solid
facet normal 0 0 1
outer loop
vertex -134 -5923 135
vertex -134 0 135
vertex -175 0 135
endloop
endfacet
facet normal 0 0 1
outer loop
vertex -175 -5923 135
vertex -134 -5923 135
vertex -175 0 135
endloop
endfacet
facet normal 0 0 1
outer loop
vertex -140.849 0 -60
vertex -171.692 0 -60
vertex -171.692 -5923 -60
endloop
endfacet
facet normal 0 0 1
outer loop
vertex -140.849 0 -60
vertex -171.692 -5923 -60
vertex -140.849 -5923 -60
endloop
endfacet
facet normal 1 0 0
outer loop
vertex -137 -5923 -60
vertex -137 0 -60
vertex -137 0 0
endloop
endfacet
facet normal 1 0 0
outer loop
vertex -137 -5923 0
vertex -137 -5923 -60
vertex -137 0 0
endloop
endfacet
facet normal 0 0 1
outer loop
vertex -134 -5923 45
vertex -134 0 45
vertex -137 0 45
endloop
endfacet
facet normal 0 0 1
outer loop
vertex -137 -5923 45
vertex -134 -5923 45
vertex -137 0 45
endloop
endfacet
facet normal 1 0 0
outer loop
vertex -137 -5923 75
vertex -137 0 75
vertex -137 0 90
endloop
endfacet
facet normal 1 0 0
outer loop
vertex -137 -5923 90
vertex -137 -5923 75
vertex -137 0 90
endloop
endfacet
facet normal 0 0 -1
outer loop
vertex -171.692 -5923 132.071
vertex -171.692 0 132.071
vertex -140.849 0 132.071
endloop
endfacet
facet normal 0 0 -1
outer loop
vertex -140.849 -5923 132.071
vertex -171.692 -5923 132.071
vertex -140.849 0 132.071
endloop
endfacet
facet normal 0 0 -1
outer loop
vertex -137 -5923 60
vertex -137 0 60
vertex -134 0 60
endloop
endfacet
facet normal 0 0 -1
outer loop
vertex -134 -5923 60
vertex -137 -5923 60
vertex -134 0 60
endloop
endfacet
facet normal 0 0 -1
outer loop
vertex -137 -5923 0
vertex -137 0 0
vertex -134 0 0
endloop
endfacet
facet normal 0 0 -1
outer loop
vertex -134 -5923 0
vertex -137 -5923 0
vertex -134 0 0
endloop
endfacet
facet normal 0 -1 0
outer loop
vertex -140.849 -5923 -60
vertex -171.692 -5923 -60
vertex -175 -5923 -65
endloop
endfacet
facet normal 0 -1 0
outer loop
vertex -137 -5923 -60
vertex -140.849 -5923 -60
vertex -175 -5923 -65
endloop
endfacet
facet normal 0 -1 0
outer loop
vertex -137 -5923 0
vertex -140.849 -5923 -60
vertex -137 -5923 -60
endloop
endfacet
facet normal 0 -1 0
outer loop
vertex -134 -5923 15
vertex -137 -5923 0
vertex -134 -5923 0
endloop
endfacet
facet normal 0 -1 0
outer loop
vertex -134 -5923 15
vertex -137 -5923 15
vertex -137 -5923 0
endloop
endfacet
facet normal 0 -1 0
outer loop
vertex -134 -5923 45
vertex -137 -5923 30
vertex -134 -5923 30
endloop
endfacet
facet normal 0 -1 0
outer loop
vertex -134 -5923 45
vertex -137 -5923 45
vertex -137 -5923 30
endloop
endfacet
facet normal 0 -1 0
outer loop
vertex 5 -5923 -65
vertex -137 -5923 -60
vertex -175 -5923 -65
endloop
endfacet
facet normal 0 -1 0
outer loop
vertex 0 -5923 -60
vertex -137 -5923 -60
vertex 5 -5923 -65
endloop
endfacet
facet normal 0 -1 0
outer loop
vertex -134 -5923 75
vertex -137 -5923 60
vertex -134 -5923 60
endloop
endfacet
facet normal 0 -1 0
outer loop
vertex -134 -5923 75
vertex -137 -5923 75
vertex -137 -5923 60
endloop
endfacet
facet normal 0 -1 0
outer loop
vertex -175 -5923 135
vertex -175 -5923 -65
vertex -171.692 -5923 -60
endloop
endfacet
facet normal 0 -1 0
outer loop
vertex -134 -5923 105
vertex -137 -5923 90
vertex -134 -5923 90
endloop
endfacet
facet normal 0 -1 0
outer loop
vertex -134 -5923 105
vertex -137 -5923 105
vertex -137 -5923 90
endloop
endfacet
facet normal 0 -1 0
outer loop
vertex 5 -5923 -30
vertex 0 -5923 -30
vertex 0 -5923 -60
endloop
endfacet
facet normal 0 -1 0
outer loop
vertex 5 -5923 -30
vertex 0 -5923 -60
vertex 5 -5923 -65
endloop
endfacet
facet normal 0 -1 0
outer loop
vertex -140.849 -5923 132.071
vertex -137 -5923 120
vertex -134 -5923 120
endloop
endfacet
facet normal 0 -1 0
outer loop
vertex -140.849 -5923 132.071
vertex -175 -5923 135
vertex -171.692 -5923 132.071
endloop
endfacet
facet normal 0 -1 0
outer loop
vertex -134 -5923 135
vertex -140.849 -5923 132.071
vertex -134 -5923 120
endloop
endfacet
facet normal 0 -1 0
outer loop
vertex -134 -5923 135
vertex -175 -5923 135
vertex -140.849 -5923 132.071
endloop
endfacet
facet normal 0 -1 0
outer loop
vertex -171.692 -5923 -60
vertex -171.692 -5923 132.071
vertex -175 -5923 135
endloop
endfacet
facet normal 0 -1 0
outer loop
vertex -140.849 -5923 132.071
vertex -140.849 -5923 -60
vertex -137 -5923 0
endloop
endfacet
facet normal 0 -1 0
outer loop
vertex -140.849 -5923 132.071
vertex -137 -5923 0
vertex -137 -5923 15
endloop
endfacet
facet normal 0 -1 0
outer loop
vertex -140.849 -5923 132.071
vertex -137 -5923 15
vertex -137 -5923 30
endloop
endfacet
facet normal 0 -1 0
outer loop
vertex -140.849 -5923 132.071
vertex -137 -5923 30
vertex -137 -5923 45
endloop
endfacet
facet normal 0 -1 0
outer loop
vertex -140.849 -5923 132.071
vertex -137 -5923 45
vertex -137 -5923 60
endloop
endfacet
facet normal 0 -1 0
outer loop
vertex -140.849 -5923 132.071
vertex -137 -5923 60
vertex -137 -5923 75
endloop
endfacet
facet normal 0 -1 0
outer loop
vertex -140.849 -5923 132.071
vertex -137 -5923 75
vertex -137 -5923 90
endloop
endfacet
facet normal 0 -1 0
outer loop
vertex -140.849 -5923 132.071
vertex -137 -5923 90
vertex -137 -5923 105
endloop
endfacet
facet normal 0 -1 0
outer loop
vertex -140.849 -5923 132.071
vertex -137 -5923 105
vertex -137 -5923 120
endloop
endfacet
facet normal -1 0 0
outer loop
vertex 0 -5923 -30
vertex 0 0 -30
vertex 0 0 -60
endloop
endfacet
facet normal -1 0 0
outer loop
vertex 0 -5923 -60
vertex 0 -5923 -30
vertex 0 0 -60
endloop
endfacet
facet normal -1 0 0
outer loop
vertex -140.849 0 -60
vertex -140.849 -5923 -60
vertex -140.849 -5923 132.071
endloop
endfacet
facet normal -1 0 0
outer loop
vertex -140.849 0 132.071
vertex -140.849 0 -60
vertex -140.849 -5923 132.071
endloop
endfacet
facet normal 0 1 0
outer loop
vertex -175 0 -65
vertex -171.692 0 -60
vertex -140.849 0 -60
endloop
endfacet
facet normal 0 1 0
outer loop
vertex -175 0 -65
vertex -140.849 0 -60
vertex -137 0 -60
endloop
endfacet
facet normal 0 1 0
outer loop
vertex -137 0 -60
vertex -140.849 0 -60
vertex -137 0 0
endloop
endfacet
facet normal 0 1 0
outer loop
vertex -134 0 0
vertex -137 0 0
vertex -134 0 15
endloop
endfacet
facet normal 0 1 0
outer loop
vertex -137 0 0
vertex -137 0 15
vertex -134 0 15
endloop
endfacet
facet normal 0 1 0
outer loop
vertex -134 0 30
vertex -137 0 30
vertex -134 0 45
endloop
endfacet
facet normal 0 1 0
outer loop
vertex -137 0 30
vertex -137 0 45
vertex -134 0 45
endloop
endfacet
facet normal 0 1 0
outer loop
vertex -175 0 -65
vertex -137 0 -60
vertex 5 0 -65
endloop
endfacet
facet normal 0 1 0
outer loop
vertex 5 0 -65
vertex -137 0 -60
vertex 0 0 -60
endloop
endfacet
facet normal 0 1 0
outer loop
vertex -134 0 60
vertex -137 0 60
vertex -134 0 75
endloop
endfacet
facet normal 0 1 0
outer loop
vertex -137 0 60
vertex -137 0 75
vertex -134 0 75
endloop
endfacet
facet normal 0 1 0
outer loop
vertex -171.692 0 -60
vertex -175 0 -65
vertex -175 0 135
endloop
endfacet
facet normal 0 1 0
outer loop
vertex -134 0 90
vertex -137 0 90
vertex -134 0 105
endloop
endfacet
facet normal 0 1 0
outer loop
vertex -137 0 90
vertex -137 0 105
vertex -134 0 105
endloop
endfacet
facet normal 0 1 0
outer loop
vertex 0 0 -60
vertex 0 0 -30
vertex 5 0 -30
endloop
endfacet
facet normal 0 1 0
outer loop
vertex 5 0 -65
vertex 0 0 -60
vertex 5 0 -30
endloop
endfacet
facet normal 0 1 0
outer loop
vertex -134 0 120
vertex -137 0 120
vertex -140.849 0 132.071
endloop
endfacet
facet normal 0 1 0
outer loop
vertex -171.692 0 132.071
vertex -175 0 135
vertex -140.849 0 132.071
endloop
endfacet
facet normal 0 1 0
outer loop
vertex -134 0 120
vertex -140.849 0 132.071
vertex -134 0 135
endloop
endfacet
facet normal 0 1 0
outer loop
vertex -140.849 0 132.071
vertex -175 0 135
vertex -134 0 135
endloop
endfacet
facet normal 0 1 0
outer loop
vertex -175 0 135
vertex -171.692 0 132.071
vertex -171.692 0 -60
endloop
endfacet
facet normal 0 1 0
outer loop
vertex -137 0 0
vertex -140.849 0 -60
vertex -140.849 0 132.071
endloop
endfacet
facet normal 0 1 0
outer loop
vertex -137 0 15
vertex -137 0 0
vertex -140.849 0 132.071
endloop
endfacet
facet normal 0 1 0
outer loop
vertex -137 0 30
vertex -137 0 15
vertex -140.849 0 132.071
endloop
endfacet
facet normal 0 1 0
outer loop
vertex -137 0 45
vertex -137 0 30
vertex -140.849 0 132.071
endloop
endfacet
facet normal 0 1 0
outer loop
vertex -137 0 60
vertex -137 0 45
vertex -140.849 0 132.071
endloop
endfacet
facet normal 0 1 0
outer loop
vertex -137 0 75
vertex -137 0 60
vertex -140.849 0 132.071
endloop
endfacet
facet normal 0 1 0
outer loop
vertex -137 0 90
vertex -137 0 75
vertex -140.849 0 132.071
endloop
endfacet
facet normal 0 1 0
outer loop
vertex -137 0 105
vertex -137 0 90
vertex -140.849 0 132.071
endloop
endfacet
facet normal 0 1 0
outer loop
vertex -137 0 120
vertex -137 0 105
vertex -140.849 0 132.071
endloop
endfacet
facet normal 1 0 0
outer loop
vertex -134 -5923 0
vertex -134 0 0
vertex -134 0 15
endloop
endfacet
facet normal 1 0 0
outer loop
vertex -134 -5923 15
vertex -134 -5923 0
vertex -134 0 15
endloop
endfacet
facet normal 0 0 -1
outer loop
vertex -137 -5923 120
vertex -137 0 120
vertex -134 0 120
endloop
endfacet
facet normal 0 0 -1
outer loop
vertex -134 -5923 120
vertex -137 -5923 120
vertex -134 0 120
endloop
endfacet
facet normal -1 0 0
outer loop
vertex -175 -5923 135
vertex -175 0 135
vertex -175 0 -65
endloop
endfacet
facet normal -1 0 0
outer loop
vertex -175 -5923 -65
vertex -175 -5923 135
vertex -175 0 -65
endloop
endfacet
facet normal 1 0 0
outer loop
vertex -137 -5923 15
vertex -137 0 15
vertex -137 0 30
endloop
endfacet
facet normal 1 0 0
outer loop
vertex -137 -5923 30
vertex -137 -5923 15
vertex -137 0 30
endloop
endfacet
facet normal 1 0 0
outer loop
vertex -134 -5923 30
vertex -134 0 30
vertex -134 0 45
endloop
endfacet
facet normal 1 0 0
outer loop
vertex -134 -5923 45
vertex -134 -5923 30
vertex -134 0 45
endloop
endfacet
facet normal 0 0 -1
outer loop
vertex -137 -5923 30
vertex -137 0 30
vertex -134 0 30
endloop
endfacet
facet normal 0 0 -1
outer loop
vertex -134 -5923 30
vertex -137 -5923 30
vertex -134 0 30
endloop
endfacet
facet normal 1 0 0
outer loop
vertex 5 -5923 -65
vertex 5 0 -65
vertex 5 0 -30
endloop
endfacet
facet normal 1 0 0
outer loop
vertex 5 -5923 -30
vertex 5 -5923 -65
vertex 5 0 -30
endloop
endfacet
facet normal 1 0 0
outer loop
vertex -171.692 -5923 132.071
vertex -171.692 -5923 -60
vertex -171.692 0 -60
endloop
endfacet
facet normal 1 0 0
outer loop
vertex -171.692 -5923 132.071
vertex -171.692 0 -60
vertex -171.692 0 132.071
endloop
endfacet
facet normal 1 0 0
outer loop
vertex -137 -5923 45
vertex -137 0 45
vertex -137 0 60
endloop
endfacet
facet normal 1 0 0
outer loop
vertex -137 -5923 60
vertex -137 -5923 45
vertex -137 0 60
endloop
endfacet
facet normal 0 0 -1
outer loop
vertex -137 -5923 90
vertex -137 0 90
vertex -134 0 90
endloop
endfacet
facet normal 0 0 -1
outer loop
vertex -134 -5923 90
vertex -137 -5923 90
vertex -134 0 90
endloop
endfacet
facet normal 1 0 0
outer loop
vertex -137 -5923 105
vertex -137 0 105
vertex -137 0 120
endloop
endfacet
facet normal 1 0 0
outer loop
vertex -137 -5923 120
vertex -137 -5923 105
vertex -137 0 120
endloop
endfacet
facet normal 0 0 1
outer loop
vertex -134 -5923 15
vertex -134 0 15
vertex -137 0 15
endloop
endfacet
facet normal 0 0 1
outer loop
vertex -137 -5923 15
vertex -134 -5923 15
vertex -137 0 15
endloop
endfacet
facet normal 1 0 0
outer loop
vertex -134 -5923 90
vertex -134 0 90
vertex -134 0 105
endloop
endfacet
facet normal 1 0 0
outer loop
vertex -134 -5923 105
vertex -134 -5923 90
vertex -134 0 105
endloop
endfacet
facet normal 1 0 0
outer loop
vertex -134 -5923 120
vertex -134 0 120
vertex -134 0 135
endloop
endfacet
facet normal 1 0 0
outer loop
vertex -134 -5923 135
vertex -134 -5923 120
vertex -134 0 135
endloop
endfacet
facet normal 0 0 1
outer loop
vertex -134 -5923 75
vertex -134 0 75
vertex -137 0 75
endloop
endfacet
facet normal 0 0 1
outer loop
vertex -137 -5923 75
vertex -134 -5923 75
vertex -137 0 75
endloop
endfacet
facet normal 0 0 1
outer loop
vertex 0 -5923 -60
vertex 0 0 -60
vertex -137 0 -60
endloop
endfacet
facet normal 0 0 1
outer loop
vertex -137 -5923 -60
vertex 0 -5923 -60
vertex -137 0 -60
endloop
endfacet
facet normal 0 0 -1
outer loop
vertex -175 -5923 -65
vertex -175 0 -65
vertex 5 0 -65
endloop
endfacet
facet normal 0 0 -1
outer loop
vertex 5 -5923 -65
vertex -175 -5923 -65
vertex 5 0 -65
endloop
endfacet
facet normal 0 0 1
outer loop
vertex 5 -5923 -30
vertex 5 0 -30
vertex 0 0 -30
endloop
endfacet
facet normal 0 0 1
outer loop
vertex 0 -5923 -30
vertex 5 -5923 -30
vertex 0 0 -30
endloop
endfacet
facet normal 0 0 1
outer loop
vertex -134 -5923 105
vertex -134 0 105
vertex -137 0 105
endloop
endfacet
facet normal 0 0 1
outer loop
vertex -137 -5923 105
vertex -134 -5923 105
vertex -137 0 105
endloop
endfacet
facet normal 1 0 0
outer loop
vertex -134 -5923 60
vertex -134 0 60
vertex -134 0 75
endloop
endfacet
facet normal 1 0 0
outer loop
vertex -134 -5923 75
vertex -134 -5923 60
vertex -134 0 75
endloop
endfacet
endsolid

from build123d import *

# Parameters (mm, degrees)
F0_W     = 30.842398
F0_H     = 192.071078
F1_DEPTH = 5923


with BuildPart() as f1:
    # F0 (on Front) → F1 (new body)
    with BuildSketch(Plane.XZ):
        Polygon((-134, 135), (-175, 135), (-175, -65), (5, -65), (5, -30), (0, -30), (0, -60), (-137, -60), (-137, 0), (-134, 0), (-134, 15), (-137, 15), (-137, 30), (-134, 30), (-134, 45), (-137, 45), (-137, 60), (-134, 60), (-134, 75), (-137, 75), (-137, 90), (-134, 90), (-134, 105), (-137, 105), (-137, 120), (-134, 120), align=None)
        with Locations((-156.270437, 36.035539)):
            Rectangle(F0_W, F0_H, mode=Mode.SUBTRACT)
    extrude(amount=F1_DEPTH)


solid = f1.part
